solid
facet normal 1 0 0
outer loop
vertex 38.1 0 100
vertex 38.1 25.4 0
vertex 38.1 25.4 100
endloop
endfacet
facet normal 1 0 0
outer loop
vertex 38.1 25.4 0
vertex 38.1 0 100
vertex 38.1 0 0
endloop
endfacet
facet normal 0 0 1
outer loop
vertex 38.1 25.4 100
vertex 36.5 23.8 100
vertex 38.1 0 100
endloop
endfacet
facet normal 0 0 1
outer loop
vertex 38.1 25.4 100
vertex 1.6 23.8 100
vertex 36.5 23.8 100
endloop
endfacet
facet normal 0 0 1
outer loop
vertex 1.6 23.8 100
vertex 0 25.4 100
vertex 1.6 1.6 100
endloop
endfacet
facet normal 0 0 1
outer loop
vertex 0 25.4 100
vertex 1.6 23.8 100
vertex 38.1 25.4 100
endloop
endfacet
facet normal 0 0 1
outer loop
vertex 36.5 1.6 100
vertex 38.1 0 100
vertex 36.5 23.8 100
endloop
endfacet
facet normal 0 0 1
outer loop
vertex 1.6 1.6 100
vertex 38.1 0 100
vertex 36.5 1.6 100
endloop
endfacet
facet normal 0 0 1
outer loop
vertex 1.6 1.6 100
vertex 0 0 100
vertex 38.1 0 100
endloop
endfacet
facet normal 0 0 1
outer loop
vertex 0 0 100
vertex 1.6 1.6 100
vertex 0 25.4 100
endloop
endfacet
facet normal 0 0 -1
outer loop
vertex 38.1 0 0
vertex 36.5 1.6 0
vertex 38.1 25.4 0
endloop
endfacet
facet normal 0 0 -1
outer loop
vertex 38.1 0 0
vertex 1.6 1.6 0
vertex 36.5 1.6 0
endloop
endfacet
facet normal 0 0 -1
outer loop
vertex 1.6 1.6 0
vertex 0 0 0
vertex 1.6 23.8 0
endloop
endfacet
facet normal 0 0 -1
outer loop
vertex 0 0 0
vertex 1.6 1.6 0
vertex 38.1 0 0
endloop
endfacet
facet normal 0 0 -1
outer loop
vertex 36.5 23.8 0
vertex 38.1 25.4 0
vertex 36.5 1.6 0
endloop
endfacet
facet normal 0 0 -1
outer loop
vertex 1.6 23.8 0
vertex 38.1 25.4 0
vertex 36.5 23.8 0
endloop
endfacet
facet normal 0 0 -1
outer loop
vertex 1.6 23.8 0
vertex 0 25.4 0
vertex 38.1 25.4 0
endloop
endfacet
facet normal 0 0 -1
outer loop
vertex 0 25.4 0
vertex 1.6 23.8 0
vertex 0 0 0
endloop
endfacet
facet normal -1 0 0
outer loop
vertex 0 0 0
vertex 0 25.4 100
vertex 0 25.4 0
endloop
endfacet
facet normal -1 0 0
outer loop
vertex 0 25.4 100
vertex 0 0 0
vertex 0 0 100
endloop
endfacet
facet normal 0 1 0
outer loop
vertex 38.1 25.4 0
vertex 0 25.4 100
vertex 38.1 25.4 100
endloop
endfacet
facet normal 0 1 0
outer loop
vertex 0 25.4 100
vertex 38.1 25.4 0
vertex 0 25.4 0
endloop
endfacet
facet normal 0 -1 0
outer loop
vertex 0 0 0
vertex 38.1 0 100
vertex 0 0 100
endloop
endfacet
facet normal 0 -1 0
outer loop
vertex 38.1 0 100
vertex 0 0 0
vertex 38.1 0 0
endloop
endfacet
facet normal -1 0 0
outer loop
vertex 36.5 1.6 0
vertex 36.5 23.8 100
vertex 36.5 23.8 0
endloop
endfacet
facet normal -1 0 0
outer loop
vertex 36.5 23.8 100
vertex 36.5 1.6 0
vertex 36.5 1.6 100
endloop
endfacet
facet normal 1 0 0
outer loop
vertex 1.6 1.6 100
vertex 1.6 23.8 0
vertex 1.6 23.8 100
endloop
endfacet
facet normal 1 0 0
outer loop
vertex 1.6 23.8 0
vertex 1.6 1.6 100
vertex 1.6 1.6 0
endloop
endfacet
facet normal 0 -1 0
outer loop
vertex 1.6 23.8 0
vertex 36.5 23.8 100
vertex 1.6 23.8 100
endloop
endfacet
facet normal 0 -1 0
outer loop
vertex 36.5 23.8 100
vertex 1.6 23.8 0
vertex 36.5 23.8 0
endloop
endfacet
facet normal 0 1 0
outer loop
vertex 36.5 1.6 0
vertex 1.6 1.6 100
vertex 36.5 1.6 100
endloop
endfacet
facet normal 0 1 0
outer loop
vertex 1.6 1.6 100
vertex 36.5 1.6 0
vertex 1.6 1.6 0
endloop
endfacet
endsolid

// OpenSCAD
// Aluminium rectangular box section: 38.1mm x 25.4mm x 1.6mm wall
// Length adjustable via L (mm)

W = 38.1;   // outer width (mm)
H = 25.4;   // outer height (mm)
t = 1.6;    // wall thickness (mm)
L = 100;    // length (mm)

$fn = 64;

module box_section_rectangular(W, H, t, L) {
    eps = 0.05; // small overlap to avoid coplanar faces

    innerW = W - 2*t;
    innerH = H - 2*t;

    assert(innerW > 0 && innerH > 0, "Wall thickness too large for given outer dimensions.");

    // Build as a single connected solid: outer tube minus inner void
    difference() {
        // Outer solid (not centered so top/bottom views clearly show the opening)
        cube([W, H, L], center=false);

        // Inner void: offset by wall thickness, extend slightly to guarantee through-cut
        translate([t, t, -eps])
            cube([innerW, innerH, L + 2*eps], center=false);
    }
}

box_section_rectangular(W, H, t, L);
